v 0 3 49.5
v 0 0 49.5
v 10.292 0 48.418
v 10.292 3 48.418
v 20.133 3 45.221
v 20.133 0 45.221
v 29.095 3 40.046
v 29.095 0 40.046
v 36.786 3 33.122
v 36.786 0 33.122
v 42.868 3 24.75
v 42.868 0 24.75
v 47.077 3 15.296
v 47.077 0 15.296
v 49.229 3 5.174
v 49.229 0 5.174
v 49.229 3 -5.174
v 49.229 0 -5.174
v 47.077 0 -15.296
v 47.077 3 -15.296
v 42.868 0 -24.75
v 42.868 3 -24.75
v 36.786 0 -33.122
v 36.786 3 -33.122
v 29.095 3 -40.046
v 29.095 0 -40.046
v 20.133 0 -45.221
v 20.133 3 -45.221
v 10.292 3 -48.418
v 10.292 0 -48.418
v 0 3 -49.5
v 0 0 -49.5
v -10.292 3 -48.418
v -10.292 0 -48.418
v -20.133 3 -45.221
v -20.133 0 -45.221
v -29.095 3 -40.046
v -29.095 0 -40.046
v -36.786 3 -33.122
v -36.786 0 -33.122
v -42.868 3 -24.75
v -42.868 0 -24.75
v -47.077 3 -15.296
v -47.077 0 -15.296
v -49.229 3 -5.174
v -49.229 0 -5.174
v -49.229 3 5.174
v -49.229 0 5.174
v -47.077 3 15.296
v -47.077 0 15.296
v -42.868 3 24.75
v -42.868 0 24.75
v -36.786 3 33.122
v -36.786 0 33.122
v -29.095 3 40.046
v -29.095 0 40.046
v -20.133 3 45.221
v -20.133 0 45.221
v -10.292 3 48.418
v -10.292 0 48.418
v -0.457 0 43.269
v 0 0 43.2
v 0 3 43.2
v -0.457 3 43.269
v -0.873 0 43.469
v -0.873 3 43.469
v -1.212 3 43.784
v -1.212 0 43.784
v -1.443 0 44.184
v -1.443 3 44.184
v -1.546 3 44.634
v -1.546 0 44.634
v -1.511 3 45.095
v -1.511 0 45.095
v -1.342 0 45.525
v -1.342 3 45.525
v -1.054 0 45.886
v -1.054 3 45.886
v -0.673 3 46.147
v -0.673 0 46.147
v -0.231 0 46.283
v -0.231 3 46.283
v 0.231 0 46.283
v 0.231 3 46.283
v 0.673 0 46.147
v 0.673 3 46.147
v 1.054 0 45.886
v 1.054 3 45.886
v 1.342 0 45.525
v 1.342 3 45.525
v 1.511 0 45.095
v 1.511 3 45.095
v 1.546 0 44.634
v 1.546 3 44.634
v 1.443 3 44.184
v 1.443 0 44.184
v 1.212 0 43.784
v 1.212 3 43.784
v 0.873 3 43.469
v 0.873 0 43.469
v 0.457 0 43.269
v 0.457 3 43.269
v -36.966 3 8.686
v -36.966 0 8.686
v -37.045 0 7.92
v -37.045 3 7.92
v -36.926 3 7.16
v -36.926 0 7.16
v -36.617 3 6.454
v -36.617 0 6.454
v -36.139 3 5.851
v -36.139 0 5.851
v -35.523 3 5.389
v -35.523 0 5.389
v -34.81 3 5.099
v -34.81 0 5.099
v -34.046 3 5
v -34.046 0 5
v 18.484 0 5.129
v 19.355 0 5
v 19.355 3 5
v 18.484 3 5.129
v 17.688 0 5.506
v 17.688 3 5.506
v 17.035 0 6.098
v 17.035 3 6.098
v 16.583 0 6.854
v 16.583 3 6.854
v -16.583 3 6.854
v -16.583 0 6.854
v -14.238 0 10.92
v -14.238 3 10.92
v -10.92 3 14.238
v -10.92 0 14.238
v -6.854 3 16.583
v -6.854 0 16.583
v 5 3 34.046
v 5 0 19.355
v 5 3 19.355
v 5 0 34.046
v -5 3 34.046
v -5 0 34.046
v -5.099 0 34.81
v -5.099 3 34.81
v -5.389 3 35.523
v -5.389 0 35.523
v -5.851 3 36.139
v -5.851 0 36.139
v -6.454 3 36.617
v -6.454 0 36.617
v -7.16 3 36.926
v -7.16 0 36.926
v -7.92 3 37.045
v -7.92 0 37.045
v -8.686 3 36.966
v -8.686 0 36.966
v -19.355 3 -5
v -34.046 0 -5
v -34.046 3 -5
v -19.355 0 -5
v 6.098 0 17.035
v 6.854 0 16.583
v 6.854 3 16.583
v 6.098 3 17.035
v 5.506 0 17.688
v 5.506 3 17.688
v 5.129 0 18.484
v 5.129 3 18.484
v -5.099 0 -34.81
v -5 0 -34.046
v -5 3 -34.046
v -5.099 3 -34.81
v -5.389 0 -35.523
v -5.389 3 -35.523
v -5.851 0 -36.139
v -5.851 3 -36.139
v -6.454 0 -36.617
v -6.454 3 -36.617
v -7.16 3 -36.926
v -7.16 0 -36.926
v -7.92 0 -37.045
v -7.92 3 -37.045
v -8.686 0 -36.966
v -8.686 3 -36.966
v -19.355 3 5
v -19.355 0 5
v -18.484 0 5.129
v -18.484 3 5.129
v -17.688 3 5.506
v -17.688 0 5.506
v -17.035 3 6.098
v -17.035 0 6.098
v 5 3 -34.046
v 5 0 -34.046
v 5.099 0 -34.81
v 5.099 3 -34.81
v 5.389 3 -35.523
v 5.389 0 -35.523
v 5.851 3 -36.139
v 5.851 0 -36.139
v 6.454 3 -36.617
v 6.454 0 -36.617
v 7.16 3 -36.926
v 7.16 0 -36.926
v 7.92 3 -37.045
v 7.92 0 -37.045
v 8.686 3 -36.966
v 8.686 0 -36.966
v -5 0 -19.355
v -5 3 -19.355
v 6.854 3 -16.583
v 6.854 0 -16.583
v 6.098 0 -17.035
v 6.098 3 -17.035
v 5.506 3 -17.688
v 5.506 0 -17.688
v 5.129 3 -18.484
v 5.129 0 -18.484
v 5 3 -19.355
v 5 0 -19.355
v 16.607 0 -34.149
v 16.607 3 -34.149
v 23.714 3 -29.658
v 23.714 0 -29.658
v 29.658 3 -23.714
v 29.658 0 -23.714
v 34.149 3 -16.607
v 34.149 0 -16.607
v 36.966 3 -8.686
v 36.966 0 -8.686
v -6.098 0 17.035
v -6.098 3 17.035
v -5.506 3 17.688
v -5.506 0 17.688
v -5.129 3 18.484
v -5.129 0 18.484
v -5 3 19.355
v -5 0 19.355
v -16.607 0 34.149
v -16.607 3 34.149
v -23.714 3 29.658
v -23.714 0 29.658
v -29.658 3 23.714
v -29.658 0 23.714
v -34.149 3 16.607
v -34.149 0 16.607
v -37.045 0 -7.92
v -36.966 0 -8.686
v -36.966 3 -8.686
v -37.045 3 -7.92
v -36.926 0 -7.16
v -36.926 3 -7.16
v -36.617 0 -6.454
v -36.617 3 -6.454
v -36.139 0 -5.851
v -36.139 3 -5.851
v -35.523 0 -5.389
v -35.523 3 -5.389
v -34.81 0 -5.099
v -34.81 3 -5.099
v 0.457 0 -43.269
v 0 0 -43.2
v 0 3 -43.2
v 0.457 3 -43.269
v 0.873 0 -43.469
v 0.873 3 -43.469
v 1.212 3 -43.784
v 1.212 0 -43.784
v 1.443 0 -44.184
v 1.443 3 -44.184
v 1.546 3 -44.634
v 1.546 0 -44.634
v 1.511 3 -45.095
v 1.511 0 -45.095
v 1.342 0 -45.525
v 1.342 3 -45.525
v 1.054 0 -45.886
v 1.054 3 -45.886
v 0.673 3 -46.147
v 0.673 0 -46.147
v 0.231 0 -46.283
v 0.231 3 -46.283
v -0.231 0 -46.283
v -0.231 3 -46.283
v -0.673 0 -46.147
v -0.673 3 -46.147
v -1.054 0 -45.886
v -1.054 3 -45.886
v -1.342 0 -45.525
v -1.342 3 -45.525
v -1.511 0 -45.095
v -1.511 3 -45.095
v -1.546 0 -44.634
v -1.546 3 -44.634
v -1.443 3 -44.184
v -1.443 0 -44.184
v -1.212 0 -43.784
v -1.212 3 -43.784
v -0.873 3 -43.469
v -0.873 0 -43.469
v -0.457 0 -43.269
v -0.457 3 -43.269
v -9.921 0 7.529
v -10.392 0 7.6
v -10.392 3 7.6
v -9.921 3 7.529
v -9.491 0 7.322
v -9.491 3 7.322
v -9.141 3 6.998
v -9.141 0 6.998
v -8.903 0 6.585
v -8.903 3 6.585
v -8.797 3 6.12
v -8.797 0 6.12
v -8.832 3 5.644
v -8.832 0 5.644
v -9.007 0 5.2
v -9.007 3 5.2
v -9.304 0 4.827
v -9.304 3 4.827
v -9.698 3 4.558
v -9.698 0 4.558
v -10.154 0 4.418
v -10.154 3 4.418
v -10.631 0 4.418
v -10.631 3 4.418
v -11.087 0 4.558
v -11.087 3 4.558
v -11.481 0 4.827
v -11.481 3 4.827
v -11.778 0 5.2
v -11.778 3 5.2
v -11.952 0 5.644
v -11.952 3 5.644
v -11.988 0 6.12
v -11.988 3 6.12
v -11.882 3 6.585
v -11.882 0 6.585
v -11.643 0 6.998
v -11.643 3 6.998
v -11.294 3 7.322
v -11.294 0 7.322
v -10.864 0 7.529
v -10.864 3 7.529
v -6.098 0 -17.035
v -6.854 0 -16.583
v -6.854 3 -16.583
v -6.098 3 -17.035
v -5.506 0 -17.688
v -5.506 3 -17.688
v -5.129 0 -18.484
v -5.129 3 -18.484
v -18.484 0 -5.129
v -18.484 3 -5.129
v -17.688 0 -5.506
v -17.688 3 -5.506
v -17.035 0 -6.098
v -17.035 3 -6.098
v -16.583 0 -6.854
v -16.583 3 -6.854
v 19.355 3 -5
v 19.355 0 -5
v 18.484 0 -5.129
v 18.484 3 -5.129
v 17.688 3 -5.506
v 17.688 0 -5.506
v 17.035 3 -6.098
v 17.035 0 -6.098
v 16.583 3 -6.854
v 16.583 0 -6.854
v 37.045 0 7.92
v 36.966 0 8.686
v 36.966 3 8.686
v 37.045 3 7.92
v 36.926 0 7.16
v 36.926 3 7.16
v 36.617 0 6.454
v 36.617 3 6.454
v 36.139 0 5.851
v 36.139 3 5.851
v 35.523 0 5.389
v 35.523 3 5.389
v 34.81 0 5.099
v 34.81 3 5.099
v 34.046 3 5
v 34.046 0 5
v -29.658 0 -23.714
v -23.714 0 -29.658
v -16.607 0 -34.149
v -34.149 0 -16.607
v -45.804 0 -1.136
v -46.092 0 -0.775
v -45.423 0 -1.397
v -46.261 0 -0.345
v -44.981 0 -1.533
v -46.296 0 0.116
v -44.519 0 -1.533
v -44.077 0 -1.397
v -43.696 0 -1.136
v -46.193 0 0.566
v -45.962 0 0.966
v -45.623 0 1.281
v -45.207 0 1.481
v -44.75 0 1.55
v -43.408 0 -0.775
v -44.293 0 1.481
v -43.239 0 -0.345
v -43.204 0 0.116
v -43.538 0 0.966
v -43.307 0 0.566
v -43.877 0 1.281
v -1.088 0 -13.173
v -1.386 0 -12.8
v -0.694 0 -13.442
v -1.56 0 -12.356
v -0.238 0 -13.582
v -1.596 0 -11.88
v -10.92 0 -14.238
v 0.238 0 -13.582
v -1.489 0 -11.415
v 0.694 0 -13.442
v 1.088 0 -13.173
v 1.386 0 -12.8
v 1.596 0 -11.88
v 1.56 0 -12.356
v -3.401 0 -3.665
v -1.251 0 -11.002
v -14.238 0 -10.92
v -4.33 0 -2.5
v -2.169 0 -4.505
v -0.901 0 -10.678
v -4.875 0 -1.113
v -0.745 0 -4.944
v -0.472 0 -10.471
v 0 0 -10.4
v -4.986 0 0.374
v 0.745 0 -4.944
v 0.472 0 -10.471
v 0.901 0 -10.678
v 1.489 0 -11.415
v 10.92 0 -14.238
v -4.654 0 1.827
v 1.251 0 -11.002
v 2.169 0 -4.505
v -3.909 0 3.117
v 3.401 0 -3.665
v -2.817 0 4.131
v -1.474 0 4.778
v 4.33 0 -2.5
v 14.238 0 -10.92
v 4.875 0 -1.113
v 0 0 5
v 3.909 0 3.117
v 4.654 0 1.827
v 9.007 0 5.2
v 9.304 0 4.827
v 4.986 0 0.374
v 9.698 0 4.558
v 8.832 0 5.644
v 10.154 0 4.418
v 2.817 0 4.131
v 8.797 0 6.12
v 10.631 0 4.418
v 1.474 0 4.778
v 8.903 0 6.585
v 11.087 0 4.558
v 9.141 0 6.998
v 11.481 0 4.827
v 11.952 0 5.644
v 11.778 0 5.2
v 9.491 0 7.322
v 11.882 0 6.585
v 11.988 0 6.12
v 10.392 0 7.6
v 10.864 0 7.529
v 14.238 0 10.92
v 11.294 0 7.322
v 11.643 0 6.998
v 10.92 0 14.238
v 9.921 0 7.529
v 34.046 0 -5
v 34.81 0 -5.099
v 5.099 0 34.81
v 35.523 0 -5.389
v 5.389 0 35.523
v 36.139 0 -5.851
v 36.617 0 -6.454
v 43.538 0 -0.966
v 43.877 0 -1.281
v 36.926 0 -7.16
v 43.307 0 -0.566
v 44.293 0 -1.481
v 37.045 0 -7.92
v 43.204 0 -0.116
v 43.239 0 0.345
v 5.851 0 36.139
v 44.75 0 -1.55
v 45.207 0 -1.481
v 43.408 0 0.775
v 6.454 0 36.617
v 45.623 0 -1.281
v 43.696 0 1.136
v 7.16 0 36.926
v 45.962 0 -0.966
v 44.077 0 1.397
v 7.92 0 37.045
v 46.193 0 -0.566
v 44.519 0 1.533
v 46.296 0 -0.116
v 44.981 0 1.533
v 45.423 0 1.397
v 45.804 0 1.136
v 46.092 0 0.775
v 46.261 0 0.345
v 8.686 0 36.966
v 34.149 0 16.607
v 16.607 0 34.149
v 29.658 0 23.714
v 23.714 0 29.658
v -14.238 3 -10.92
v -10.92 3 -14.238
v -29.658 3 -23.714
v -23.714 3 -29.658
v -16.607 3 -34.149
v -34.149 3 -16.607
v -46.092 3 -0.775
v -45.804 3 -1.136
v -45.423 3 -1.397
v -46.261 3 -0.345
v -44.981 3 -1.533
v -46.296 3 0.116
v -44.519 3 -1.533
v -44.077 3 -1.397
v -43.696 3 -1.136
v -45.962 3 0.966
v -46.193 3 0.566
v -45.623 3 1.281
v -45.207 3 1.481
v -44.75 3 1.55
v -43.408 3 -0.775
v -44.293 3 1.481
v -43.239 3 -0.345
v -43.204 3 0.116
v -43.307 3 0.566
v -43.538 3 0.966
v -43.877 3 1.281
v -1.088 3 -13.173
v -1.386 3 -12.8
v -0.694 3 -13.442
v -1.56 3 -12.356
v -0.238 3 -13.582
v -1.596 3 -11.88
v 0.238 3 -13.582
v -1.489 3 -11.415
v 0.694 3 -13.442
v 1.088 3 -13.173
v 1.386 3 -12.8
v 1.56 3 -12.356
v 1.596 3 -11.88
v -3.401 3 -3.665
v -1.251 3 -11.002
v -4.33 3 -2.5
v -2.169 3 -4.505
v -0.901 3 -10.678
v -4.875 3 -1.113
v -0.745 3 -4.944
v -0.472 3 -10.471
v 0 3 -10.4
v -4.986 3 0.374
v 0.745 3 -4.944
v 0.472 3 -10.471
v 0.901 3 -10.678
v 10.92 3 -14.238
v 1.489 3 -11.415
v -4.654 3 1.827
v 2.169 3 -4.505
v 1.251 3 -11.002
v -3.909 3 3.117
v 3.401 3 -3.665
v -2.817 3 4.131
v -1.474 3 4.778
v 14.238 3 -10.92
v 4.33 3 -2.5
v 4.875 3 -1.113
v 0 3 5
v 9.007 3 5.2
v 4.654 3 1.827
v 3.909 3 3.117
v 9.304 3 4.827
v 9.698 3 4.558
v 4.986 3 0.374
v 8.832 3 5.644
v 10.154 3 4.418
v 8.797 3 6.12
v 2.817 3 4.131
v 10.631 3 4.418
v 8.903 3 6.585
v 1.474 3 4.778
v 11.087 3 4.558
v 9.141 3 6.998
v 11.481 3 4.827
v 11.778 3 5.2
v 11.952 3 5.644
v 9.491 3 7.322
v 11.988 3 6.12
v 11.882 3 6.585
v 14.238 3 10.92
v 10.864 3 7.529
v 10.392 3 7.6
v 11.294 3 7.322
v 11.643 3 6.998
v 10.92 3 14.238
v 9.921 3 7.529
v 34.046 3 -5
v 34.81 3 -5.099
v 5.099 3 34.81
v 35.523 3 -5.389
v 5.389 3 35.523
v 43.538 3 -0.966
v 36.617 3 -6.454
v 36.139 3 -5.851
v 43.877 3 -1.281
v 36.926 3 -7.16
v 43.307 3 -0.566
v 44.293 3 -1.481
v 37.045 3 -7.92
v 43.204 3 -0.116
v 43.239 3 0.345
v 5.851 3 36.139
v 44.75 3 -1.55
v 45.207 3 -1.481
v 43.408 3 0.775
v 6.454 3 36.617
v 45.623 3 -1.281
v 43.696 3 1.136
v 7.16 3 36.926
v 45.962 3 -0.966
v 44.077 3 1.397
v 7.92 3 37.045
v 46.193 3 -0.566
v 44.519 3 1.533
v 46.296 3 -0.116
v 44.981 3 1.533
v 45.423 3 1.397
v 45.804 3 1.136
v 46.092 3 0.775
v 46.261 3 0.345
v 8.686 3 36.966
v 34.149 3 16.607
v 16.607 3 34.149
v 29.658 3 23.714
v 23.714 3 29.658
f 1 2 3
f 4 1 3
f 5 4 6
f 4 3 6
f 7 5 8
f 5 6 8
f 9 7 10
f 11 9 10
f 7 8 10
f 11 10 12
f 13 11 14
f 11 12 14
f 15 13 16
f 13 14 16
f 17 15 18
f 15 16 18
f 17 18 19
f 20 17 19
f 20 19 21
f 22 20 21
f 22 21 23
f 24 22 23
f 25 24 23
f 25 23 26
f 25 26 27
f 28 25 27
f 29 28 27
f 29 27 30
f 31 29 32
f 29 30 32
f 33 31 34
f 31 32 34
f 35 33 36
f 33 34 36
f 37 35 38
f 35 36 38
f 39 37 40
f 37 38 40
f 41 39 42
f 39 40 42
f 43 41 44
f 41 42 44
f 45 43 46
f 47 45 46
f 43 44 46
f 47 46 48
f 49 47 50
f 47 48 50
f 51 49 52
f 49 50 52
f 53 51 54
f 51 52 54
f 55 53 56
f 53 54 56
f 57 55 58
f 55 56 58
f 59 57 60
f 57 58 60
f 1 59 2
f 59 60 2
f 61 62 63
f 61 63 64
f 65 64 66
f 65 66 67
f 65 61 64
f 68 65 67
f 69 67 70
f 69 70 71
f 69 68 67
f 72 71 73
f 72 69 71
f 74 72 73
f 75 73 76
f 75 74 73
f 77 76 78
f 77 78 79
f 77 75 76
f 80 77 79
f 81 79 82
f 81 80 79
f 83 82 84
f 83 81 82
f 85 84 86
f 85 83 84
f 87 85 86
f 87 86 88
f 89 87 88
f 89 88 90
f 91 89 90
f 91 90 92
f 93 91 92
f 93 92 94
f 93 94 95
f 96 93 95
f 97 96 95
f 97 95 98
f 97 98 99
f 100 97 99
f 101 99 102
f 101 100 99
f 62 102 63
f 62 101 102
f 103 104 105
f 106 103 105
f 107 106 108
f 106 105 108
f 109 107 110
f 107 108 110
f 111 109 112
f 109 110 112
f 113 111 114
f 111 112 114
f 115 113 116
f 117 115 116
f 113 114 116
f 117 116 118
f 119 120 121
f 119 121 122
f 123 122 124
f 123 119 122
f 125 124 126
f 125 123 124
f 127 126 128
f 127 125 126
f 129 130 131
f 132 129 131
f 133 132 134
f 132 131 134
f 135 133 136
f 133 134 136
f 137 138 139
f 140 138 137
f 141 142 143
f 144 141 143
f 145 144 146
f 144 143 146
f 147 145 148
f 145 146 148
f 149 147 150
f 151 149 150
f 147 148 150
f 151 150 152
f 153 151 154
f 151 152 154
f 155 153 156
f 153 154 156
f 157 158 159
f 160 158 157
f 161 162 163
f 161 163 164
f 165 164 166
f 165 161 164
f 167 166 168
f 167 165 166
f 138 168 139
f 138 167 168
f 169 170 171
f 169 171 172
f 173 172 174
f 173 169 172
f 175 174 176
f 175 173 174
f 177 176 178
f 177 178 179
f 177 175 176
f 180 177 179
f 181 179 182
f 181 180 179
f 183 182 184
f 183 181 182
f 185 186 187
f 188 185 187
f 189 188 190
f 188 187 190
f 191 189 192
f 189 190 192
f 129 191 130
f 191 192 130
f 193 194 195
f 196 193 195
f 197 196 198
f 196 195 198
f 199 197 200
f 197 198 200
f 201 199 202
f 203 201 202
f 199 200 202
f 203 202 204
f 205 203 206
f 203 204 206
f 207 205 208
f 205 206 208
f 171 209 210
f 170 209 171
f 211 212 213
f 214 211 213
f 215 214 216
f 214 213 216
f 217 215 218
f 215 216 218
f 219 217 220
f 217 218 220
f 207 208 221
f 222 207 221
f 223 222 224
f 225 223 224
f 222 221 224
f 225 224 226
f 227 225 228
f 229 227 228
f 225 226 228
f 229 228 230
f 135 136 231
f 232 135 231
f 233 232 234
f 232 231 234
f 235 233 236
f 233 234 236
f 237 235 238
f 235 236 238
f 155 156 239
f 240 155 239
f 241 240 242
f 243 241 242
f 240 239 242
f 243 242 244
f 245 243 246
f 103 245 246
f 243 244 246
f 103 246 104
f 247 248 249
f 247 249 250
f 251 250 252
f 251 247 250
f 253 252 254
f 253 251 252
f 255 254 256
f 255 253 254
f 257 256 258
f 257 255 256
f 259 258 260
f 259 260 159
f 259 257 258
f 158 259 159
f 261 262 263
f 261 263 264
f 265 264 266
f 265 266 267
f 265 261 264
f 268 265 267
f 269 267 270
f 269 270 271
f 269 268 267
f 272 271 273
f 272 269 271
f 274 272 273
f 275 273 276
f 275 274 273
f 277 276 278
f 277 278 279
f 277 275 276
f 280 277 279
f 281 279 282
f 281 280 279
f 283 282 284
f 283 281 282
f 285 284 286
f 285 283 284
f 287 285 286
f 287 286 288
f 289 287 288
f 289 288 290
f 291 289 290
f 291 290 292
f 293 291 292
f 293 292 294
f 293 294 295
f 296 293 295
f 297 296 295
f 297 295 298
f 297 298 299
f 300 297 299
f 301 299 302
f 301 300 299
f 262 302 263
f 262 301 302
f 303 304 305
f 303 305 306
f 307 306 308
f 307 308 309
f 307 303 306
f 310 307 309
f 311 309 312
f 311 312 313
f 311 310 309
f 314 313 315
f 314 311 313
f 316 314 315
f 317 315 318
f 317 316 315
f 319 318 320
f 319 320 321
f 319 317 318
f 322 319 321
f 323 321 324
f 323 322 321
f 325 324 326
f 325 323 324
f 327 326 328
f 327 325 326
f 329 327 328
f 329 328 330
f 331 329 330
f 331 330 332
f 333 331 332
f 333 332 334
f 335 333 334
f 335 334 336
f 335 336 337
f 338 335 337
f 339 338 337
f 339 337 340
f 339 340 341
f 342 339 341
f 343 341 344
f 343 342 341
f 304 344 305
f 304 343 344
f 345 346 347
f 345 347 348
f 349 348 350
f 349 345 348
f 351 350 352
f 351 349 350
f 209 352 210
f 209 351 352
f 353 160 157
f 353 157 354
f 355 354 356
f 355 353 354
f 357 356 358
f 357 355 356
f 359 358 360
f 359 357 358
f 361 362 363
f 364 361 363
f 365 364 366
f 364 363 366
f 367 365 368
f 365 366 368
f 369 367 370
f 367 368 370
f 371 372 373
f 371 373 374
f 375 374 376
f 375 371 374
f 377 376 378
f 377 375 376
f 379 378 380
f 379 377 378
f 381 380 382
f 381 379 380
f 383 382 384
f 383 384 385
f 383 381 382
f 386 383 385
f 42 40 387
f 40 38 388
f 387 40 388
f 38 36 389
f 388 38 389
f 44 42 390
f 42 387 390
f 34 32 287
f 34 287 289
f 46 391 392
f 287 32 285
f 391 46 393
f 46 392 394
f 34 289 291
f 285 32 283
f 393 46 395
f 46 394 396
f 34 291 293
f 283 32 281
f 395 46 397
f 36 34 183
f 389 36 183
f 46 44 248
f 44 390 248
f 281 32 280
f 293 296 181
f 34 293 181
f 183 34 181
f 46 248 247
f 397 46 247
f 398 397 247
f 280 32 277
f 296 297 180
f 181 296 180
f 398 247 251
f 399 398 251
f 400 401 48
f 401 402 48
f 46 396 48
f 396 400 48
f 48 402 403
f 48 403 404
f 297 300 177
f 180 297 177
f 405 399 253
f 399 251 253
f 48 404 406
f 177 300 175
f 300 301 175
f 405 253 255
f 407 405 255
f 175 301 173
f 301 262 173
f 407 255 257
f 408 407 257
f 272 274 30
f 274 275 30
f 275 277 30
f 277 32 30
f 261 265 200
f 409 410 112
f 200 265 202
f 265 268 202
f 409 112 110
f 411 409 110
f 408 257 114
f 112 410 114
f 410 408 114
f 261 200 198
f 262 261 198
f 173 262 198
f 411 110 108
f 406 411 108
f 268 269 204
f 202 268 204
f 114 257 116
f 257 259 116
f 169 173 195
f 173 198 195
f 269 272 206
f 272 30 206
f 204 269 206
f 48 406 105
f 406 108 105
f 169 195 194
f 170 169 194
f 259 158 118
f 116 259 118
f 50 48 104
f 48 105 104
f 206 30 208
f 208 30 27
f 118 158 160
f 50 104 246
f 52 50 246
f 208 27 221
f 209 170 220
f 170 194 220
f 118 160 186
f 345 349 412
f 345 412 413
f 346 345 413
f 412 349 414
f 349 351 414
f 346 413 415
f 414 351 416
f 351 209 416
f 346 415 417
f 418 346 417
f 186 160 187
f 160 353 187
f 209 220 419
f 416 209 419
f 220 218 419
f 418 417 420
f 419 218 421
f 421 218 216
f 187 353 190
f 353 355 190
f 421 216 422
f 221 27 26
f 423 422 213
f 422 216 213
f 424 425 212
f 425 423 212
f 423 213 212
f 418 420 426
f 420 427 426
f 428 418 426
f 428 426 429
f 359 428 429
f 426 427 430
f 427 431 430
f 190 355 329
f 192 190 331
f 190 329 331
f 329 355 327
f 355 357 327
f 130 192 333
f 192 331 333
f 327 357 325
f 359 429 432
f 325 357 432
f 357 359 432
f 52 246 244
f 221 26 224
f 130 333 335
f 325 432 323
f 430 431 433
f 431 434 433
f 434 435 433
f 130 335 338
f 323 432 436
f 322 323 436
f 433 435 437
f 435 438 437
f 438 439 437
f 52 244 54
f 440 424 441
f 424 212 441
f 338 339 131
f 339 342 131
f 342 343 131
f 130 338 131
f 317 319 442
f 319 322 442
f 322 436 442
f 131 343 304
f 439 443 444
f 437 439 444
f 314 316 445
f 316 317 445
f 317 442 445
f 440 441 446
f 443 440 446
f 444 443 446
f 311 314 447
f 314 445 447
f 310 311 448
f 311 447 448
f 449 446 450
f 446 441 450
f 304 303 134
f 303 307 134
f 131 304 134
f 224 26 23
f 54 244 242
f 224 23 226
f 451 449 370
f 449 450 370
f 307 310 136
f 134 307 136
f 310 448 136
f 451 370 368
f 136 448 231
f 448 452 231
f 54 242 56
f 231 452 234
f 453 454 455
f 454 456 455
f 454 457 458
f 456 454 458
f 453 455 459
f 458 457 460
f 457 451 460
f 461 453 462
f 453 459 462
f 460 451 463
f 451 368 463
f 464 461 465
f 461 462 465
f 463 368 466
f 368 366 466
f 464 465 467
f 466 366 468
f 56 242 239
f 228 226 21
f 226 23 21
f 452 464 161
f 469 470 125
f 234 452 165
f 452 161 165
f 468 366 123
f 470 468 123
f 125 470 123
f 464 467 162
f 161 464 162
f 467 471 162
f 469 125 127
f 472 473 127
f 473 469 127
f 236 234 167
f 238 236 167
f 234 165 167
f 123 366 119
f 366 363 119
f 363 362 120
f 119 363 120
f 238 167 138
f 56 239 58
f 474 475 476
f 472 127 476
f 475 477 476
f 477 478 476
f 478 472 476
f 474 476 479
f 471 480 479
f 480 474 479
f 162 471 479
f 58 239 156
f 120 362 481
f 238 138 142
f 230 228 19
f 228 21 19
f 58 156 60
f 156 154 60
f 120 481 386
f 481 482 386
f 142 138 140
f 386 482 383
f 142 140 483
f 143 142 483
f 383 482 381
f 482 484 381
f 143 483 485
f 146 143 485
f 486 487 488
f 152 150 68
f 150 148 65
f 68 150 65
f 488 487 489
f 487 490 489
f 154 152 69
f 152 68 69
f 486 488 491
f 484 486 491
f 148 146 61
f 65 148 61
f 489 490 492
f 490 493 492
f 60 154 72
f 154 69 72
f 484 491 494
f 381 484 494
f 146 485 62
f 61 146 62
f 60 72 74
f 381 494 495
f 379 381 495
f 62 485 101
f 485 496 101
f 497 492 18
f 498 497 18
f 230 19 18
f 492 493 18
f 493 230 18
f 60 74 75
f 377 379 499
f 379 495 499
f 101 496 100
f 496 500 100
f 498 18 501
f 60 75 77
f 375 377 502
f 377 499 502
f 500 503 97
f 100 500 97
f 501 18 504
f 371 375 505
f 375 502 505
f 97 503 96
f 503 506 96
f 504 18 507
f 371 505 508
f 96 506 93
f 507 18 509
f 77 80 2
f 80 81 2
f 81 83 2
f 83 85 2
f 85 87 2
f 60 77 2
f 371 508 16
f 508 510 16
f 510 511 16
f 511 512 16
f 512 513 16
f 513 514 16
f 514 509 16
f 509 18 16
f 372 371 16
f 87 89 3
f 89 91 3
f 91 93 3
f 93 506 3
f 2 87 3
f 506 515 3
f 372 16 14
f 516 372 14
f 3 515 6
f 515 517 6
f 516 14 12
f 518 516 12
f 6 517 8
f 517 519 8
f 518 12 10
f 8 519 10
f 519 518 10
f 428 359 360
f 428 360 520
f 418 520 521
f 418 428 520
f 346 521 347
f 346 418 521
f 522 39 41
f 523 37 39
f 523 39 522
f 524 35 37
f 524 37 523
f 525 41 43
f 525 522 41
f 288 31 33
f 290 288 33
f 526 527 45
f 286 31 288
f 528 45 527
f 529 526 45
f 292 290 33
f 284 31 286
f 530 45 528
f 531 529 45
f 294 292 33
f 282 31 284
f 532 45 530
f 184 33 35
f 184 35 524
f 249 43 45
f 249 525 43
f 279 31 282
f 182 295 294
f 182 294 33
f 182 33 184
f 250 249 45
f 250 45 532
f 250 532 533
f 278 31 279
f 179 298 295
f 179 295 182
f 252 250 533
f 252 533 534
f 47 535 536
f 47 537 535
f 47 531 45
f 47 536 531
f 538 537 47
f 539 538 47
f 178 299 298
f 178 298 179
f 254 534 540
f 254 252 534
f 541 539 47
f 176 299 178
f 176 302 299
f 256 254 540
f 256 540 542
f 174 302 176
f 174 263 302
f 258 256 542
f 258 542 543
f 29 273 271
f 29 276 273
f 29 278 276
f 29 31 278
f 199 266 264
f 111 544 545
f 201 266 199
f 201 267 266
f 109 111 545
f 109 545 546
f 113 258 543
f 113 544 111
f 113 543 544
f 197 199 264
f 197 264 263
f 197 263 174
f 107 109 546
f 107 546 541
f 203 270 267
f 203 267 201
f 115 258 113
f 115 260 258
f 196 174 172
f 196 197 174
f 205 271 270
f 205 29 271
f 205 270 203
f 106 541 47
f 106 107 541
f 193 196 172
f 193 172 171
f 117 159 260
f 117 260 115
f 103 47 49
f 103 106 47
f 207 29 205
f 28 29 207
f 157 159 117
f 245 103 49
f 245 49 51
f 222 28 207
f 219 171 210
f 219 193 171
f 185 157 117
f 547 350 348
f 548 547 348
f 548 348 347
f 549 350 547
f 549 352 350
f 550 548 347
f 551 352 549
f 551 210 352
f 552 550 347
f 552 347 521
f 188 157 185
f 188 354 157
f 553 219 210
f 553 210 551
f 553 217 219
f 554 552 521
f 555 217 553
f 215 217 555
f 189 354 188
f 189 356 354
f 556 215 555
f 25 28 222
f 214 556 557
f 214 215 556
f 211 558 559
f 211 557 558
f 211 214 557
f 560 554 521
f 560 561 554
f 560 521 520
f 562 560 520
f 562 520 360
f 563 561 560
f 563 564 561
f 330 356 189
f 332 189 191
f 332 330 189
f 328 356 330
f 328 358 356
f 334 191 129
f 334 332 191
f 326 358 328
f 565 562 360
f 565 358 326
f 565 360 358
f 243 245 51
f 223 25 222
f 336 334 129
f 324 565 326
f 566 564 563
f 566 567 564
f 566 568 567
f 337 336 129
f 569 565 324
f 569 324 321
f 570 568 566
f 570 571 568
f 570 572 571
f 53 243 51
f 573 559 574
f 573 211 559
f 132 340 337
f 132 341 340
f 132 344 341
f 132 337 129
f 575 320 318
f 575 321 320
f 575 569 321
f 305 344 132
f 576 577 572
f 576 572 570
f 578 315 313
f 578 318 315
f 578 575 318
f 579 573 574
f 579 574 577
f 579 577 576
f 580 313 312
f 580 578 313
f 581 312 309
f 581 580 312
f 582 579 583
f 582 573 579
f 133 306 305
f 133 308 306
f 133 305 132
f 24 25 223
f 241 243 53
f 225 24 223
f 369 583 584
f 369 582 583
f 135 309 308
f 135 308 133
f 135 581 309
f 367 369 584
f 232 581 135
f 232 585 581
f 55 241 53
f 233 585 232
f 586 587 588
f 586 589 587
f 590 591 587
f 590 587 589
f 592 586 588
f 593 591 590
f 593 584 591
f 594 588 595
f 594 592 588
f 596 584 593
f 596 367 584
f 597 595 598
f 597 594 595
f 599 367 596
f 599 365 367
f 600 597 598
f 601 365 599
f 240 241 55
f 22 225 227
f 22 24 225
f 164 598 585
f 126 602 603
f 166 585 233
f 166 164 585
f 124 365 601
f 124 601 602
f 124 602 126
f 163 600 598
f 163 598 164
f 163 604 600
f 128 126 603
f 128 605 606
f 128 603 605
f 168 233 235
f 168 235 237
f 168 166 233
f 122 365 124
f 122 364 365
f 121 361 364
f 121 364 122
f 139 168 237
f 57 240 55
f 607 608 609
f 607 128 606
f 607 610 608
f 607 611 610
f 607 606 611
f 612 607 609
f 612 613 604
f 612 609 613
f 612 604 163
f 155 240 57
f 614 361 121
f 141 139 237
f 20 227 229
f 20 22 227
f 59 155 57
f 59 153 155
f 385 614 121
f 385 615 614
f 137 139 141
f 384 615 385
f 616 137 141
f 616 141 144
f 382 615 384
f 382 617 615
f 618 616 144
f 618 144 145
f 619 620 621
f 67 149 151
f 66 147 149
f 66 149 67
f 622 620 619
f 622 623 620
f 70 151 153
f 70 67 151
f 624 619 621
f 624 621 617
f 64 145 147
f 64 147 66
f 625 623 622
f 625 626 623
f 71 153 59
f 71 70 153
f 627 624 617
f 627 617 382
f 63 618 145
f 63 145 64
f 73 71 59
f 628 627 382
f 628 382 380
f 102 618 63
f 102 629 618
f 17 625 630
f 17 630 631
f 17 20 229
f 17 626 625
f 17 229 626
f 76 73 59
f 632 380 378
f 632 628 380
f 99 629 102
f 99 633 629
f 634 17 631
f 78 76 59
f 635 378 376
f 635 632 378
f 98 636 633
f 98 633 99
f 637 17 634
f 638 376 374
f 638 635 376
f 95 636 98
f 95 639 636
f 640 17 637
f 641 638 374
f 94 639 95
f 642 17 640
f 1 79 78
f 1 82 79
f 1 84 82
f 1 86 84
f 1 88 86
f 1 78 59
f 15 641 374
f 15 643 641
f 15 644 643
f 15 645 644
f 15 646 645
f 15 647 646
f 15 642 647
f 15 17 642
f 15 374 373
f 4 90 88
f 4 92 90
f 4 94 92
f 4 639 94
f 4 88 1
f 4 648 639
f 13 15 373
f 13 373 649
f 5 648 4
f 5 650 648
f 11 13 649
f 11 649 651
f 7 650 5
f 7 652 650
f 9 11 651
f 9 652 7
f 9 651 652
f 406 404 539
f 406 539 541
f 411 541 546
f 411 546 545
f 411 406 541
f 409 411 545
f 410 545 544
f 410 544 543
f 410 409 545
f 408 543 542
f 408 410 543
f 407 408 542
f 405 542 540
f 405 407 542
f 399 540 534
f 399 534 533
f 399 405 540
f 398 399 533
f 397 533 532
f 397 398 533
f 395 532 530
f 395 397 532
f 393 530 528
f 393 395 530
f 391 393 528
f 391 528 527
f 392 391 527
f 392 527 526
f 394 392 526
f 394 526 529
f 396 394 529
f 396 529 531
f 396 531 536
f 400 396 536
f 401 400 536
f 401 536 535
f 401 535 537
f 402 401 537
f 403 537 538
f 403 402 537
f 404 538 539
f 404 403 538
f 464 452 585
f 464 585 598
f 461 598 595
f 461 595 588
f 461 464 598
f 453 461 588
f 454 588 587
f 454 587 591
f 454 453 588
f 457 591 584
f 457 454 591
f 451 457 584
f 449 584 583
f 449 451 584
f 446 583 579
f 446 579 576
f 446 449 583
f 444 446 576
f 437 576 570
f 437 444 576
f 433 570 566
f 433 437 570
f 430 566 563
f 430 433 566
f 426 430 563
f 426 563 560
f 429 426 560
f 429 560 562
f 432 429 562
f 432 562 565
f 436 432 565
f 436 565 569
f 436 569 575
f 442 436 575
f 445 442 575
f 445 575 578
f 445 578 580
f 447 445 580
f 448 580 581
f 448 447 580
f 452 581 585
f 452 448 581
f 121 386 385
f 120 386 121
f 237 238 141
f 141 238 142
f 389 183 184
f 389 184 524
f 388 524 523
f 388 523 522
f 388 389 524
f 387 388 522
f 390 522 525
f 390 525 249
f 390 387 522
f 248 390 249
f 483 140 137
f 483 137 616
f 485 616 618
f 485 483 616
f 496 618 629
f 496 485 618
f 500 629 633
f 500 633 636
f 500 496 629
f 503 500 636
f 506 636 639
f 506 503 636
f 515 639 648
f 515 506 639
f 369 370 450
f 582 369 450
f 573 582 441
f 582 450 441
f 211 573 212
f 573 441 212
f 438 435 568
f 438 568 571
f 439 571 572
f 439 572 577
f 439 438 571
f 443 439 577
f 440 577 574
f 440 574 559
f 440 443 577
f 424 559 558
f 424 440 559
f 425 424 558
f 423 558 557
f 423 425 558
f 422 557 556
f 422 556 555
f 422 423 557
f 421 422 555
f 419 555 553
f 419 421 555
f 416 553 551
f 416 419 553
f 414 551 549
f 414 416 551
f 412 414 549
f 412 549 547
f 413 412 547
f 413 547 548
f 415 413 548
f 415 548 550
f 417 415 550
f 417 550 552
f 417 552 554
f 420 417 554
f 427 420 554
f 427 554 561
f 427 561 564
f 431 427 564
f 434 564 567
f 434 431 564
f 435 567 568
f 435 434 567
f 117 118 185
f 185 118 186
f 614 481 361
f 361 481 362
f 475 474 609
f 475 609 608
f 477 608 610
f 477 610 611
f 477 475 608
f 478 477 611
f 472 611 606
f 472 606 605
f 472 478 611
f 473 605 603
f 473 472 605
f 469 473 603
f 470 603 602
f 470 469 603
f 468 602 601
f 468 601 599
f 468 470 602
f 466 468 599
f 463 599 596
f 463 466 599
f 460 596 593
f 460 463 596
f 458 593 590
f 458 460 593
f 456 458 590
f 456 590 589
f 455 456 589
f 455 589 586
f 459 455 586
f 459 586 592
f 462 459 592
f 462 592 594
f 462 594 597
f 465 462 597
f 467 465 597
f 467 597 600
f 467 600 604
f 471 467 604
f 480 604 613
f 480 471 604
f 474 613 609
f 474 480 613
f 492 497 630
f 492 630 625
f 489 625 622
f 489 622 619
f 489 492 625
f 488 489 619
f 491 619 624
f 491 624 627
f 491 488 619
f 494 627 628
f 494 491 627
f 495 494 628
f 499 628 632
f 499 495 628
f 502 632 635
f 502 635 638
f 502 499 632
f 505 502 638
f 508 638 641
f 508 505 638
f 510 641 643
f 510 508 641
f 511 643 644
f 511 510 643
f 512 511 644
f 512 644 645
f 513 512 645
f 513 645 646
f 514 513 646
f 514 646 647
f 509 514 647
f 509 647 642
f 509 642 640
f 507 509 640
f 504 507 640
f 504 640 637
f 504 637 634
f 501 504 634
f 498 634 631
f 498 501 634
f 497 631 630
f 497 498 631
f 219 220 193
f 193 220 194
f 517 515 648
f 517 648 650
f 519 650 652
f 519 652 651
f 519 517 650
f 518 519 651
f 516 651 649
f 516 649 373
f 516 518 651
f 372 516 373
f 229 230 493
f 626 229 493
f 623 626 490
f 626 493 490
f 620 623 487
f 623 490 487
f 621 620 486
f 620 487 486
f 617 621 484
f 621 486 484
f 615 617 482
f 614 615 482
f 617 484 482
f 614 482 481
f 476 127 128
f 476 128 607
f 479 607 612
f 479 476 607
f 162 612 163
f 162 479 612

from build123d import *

# Parameters (mm, degrees)
SKETCH_1_R      = 49.5
SKETCH_1_R_2    = 1.55
SKETCH_1_R_3    = 5
SKETCH_1_R_4    = 1.6
EXTRUDE_1_DEPTH = 3


with BuildPart() as part:
    # 草图1 → 凸台-拉伸1 (new body)
    with BuildSketch(Plane(origin=(0, 0, 0), x_dir=(1, 0, 0), z_dir=(0, 1, 0))):
        with Locations(Location((0, 0, 0), (0, 0, 270))):
            Circle(SKETCH_1_R)
        with Locations(Location((0, 44.75, 0), (0, 0, 270))):
            Circle(SKETCH_1_R_2, mode=Mode.SUBTRACT)
        with Locations(Location((-44.75, 0, 0), (0, 0, 270))):
            Circle(SKETCH_1_R_2, mode=Mode.SUBTRACT)
        with Locations(Location((0, -44.75, 0), (0, 0, 90))):
            Circle(SKETCH_1_R_2, mode=Mode.SUBTRACT)
        with Locations(Location((44.75, 0, 0), (0, 0, 90))):
            Circle(SKETCH_1_R_2, mode=Mode.SUBTRACT)
        with Locations(Location((0, 0, 0), (0, 0, 270))):
            Circle(SKETCH_1_R_3, mode=Mode.SUBTRACT)
        with Locations(Location((0, 12, 0), (0, 0, 270))):
            Circle(SKETCH_1_R_4, mode=Mode.SUBTRACT)
        with Locations(Location((10.392304845, -6, 0), (0, 0, 270))):
            Circle(SKETCH_1_R_4, mode=Mode.SUBTRACT)
        with Locations(Location((-10.392304845, -6, 0), (0, 0, 270))):
            Circle(SKETCH_1_R_4, mode=Mode.SUBTRACT)
        with BuildLine():
            Line((-34.045948677, 5), (-19.355269263, 5))
            ThreePointArc((-19.355269263, 5), (-17.687611546, 5.506224201), (-16.582759625, 6.854054841))
            ThreePointArc((-16.582759625, 6.854054841), (-12.687907325, 12.687907325), (-6.854054841, 16.582759625))
            ThreePointArc((-6.854054841, 16.582759625), (-5.506224201, 17.687611546), (-5, 19.355269263))
            Line((-5, 19.355269263), (-5, 34.045948677))
            ThreePointArc((-5, 34.045948677), (-6.137034306, 36.397407548), (-8.686239215, 36.966406815))
            ThreePointArc((-8.686239215, 36.966406815), (-26.851126462, 26.851126462), (-36.966406815, 8.686239215))
            ThreePointArc((-36.966406815, 8.686239215), (-36.397407548, 6.137034306), (-34.045948677, 5))
        make_face(mode=Mode.SUBTRACT)
        with BuildLine():
            Line((34.045948677, 5), (19.355269263, 5))
            ThreePointArc((19.355269263, 5), (17.687611546, 5.506224201), (16.582759625, 6.854054841))
            ThreePointArc((16.582759625, 6.854054841), (12.687907325, 12.687907325), (6.854054841, 16.582759625))
            ThreePointArc((6.854054841, 16.582759625), (5.506224201, 17.687611546), (5, 19.355269263))
            Line((5, 19.355269263), (5, 34.045948677))
            ThreePointArc((5, 34.045948677), (6.137034306, 36.397407548), (8.686239215, 36.966406815))
            ThreePointArc((8.686239215, 36.966406815), (26.851126462, 26.851126462), (36.966406815, 8.686239215))
            ThreePointArc((36.966406815, 8.686239215), (36.397407548, 6.137034306), (34.045948677, 5))
        make_face(mode=Mode.SUBTRACT)
        with BuildLine():
            Line((34.045948677, -5), (19.355269263, -5))
            ThreePointArc((19.355269263, -5), (17.687611546, -5.506224201), (16.582759625, -6.854054841))
            ThreePointArc((16.582759625, -6.854054841), (12.687907325, -12.687907325), (6.854054841, -16.582759625))
            ThreePointArc((6.854054841, -16.582759625), (5.506224201, -17.687611546), (5, -19.355269263))
            Line((5, -19.355269263), (5, -34.045948677))
            ThreePointArc((5, -34.045948677), (6.137034306, -36.397407548), (8.686239215, -36.966406815))
            ThreePointArc((8.686239215, -36.966406815), (26.851126462, -26.851126462), (36.966406815, -8.686239215))
            ThreePointArc((36.966406815, -8.686239215), (36.397407548, -6.137034306), (34.045948677, -5))
        make_face(mode=Mode.SUBTRACT)
        with BuildLine():
            Line((-34.045948677, -5), (-19.355269263, -5))
            ThreePointArc((-19.355269263, -5), (-17.687611546, -5.506224201), (-16.582759625, -6.854054841))
            ThreePointArc((-16.582759625, -6.854054841), (-12.687907325, -12.687907325), (-6.854054841, -16.582759625))
            ThreePointArc((-6.854054841, -16.582759625), (-5.506224201, -17.687611546), (-5, -19.355269263))
            Line((-5, -19.355269263), (-5, -34.045948677))
            ThreePointArc((-5, -34.045948677), (-6.137034306, -36.397407548), (-8.686239215, -36.966406815))
            ThreePointArc((-8.686239215, -36.966406815), (-26.851126462, -26.851126462), (-36.966406815, -8.686239215))
            ThreePointArc((-36.966406815, -8.686239215), (-36.397407548, -6.137034306), (-34.045948677, -5))
        make_face(mode=Mode.SUBTRACT)
    extrude(amount=EXTRUDE_1_DEPTH)


solid = part.part
